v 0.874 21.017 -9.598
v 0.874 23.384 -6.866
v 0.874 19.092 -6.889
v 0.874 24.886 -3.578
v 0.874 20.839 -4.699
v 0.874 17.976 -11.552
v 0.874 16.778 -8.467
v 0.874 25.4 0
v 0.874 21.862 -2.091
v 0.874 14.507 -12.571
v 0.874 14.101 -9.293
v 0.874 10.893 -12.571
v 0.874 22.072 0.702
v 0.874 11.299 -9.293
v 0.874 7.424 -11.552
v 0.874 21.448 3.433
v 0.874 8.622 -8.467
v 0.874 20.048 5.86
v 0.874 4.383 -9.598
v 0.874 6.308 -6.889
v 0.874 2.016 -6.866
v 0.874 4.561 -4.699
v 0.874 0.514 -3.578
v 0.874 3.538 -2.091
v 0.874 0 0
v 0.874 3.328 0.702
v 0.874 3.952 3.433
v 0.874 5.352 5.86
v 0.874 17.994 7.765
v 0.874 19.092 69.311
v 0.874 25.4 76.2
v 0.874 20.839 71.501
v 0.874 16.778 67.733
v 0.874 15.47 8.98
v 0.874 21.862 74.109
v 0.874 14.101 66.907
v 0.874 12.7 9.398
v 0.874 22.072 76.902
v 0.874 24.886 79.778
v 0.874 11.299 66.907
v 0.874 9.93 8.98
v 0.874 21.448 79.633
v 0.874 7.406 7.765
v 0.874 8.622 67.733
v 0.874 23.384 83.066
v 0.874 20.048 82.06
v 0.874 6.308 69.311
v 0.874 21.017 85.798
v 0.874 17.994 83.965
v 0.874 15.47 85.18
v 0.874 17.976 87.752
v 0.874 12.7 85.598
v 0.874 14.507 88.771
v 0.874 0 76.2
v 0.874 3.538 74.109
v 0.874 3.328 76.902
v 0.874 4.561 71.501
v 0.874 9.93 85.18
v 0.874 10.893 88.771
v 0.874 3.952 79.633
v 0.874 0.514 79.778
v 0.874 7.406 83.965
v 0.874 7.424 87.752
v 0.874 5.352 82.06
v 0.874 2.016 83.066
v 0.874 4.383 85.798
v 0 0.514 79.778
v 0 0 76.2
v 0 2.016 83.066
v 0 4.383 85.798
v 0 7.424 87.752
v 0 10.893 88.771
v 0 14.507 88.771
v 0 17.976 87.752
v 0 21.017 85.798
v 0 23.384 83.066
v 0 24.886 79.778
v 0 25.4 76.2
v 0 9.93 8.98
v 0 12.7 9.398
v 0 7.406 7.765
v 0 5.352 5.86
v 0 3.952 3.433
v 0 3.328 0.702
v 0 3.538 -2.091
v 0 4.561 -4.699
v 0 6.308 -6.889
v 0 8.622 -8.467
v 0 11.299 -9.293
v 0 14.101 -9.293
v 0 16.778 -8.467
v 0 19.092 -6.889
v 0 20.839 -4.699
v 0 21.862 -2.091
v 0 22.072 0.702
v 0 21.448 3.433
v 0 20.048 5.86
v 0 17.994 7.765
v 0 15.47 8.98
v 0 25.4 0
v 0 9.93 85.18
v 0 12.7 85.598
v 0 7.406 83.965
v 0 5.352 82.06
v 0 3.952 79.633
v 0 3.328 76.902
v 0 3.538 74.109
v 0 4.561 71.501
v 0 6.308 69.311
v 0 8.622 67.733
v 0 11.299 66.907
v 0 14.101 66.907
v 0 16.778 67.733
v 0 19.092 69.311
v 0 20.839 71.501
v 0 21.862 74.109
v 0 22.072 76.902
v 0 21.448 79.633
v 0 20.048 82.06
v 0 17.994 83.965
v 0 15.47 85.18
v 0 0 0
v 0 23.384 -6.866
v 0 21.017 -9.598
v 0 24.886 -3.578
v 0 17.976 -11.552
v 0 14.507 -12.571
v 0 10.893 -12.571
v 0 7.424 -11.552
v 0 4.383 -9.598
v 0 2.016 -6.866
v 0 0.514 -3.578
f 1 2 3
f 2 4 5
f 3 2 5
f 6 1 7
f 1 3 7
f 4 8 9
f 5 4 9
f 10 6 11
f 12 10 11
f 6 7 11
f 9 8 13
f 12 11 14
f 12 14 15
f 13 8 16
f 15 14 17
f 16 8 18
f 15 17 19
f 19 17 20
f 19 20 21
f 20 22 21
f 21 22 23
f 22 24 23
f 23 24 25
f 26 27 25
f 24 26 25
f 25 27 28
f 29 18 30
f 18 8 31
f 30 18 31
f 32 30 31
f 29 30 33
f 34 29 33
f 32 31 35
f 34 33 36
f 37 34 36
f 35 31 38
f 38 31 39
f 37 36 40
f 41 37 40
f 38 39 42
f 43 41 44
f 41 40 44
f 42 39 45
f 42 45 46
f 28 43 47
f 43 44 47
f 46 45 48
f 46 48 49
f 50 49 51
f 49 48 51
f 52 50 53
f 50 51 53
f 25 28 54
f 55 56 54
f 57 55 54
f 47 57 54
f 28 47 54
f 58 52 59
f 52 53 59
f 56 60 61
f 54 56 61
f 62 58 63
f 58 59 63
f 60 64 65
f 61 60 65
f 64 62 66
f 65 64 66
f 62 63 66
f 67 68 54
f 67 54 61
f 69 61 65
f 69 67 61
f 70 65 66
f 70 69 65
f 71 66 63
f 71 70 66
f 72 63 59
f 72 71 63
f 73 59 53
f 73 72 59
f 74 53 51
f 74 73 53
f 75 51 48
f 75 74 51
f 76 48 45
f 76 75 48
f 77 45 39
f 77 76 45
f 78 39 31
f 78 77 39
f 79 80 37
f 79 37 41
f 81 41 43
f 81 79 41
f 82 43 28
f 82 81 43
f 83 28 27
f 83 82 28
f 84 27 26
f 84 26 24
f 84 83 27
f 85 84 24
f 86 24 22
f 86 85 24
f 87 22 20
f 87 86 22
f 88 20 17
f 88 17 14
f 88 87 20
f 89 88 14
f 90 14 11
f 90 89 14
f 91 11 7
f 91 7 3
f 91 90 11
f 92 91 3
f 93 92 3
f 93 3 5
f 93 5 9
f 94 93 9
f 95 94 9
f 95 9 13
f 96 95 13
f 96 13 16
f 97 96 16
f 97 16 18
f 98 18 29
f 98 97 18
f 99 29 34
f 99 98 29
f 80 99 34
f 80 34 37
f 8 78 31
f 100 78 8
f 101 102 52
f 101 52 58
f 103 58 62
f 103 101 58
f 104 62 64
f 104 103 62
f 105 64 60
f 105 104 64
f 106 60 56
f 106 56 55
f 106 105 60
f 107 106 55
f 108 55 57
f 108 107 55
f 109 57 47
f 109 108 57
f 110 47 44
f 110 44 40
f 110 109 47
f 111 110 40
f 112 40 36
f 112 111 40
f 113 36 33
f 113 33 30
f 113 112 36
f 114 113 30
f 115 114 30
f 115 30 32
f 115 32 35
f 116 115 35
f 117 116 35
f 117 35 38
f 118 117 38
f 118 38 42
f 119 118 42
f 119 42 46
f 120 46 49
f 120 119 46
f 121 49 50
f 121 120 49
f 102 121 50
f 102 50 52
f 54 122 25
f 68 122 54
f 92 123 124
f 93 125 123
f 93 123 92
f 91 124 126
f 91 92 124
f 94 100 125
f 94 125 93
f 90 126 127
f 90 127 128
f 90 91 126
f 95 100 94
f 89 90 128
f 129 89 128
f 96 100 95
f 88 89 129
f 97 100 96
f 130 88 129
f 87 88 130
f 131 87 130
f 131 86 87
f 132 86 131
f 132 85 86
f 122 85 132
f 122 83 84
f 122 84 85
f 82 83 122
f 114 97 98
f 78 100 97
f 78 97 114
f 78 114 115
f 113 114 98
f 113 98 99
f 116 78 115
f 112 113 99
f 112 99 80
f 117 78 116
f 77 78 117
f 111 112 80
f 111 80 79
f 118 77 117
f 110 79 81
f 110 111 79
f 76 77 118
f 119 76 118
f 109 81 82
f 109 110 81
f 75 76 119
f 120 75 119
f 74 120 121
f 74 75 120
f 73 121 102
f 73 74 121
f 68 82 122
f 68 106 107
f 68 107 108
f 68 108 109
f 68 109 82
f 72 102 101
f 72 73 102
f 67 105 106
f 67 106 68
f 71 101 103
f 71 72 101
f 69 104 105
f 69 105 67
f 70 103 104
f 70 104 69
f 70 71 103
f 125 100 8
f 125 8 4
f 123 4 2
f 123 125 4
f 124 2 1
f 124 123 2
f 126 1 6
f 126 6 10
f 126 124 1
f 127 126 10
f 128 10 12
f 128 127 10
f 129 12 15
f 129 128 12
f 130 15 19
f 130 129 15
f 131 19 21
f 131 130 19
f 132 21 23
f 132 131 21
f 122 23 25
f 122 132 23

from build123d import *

# Parameters (mm, degrees)
BOSS_EXTRUDE1_DEPTH = 0.87376
SKETCH2_R           = 9.398
CUT_EXTRUDE1_DEPTH  = 0.87376


with BuildPart() as part:
    # Sketch1 → Boss-Extrude1 (new body)
    with BuildSketch(Plane.YZ):
        with BuildLine():
            Line((0, 0), (0, 76.2))
            ThreePointArc((0, 76.2), (12.7, 88.9), (25.4, 76.2))
            Line((25.4, 76.2), (25.4, 0))
            ThreePointArc((25.4, 0), (12.7, -12.7), (0, 0))
        make_face()
    extrude(amount=BOSS_EXTRUDE1_DEPTH)

    # Sketch2 → Cut-Extrude1 (cut)
    with BuildSketch(Plane.YZ):
        with Locations(Location((12.7, 76.2, 0), (0, 0, 90))):
            Circle(SKETCH2_R)
        with Locations(Location((12.7, 0, 0), (0, 0, 90))):
            Circle(SKETCH2_R)
    extrude(amount=CUT_EXTRUDE1_DEPTH, mode=Mode.SUBTRACT)


solid = part.part
